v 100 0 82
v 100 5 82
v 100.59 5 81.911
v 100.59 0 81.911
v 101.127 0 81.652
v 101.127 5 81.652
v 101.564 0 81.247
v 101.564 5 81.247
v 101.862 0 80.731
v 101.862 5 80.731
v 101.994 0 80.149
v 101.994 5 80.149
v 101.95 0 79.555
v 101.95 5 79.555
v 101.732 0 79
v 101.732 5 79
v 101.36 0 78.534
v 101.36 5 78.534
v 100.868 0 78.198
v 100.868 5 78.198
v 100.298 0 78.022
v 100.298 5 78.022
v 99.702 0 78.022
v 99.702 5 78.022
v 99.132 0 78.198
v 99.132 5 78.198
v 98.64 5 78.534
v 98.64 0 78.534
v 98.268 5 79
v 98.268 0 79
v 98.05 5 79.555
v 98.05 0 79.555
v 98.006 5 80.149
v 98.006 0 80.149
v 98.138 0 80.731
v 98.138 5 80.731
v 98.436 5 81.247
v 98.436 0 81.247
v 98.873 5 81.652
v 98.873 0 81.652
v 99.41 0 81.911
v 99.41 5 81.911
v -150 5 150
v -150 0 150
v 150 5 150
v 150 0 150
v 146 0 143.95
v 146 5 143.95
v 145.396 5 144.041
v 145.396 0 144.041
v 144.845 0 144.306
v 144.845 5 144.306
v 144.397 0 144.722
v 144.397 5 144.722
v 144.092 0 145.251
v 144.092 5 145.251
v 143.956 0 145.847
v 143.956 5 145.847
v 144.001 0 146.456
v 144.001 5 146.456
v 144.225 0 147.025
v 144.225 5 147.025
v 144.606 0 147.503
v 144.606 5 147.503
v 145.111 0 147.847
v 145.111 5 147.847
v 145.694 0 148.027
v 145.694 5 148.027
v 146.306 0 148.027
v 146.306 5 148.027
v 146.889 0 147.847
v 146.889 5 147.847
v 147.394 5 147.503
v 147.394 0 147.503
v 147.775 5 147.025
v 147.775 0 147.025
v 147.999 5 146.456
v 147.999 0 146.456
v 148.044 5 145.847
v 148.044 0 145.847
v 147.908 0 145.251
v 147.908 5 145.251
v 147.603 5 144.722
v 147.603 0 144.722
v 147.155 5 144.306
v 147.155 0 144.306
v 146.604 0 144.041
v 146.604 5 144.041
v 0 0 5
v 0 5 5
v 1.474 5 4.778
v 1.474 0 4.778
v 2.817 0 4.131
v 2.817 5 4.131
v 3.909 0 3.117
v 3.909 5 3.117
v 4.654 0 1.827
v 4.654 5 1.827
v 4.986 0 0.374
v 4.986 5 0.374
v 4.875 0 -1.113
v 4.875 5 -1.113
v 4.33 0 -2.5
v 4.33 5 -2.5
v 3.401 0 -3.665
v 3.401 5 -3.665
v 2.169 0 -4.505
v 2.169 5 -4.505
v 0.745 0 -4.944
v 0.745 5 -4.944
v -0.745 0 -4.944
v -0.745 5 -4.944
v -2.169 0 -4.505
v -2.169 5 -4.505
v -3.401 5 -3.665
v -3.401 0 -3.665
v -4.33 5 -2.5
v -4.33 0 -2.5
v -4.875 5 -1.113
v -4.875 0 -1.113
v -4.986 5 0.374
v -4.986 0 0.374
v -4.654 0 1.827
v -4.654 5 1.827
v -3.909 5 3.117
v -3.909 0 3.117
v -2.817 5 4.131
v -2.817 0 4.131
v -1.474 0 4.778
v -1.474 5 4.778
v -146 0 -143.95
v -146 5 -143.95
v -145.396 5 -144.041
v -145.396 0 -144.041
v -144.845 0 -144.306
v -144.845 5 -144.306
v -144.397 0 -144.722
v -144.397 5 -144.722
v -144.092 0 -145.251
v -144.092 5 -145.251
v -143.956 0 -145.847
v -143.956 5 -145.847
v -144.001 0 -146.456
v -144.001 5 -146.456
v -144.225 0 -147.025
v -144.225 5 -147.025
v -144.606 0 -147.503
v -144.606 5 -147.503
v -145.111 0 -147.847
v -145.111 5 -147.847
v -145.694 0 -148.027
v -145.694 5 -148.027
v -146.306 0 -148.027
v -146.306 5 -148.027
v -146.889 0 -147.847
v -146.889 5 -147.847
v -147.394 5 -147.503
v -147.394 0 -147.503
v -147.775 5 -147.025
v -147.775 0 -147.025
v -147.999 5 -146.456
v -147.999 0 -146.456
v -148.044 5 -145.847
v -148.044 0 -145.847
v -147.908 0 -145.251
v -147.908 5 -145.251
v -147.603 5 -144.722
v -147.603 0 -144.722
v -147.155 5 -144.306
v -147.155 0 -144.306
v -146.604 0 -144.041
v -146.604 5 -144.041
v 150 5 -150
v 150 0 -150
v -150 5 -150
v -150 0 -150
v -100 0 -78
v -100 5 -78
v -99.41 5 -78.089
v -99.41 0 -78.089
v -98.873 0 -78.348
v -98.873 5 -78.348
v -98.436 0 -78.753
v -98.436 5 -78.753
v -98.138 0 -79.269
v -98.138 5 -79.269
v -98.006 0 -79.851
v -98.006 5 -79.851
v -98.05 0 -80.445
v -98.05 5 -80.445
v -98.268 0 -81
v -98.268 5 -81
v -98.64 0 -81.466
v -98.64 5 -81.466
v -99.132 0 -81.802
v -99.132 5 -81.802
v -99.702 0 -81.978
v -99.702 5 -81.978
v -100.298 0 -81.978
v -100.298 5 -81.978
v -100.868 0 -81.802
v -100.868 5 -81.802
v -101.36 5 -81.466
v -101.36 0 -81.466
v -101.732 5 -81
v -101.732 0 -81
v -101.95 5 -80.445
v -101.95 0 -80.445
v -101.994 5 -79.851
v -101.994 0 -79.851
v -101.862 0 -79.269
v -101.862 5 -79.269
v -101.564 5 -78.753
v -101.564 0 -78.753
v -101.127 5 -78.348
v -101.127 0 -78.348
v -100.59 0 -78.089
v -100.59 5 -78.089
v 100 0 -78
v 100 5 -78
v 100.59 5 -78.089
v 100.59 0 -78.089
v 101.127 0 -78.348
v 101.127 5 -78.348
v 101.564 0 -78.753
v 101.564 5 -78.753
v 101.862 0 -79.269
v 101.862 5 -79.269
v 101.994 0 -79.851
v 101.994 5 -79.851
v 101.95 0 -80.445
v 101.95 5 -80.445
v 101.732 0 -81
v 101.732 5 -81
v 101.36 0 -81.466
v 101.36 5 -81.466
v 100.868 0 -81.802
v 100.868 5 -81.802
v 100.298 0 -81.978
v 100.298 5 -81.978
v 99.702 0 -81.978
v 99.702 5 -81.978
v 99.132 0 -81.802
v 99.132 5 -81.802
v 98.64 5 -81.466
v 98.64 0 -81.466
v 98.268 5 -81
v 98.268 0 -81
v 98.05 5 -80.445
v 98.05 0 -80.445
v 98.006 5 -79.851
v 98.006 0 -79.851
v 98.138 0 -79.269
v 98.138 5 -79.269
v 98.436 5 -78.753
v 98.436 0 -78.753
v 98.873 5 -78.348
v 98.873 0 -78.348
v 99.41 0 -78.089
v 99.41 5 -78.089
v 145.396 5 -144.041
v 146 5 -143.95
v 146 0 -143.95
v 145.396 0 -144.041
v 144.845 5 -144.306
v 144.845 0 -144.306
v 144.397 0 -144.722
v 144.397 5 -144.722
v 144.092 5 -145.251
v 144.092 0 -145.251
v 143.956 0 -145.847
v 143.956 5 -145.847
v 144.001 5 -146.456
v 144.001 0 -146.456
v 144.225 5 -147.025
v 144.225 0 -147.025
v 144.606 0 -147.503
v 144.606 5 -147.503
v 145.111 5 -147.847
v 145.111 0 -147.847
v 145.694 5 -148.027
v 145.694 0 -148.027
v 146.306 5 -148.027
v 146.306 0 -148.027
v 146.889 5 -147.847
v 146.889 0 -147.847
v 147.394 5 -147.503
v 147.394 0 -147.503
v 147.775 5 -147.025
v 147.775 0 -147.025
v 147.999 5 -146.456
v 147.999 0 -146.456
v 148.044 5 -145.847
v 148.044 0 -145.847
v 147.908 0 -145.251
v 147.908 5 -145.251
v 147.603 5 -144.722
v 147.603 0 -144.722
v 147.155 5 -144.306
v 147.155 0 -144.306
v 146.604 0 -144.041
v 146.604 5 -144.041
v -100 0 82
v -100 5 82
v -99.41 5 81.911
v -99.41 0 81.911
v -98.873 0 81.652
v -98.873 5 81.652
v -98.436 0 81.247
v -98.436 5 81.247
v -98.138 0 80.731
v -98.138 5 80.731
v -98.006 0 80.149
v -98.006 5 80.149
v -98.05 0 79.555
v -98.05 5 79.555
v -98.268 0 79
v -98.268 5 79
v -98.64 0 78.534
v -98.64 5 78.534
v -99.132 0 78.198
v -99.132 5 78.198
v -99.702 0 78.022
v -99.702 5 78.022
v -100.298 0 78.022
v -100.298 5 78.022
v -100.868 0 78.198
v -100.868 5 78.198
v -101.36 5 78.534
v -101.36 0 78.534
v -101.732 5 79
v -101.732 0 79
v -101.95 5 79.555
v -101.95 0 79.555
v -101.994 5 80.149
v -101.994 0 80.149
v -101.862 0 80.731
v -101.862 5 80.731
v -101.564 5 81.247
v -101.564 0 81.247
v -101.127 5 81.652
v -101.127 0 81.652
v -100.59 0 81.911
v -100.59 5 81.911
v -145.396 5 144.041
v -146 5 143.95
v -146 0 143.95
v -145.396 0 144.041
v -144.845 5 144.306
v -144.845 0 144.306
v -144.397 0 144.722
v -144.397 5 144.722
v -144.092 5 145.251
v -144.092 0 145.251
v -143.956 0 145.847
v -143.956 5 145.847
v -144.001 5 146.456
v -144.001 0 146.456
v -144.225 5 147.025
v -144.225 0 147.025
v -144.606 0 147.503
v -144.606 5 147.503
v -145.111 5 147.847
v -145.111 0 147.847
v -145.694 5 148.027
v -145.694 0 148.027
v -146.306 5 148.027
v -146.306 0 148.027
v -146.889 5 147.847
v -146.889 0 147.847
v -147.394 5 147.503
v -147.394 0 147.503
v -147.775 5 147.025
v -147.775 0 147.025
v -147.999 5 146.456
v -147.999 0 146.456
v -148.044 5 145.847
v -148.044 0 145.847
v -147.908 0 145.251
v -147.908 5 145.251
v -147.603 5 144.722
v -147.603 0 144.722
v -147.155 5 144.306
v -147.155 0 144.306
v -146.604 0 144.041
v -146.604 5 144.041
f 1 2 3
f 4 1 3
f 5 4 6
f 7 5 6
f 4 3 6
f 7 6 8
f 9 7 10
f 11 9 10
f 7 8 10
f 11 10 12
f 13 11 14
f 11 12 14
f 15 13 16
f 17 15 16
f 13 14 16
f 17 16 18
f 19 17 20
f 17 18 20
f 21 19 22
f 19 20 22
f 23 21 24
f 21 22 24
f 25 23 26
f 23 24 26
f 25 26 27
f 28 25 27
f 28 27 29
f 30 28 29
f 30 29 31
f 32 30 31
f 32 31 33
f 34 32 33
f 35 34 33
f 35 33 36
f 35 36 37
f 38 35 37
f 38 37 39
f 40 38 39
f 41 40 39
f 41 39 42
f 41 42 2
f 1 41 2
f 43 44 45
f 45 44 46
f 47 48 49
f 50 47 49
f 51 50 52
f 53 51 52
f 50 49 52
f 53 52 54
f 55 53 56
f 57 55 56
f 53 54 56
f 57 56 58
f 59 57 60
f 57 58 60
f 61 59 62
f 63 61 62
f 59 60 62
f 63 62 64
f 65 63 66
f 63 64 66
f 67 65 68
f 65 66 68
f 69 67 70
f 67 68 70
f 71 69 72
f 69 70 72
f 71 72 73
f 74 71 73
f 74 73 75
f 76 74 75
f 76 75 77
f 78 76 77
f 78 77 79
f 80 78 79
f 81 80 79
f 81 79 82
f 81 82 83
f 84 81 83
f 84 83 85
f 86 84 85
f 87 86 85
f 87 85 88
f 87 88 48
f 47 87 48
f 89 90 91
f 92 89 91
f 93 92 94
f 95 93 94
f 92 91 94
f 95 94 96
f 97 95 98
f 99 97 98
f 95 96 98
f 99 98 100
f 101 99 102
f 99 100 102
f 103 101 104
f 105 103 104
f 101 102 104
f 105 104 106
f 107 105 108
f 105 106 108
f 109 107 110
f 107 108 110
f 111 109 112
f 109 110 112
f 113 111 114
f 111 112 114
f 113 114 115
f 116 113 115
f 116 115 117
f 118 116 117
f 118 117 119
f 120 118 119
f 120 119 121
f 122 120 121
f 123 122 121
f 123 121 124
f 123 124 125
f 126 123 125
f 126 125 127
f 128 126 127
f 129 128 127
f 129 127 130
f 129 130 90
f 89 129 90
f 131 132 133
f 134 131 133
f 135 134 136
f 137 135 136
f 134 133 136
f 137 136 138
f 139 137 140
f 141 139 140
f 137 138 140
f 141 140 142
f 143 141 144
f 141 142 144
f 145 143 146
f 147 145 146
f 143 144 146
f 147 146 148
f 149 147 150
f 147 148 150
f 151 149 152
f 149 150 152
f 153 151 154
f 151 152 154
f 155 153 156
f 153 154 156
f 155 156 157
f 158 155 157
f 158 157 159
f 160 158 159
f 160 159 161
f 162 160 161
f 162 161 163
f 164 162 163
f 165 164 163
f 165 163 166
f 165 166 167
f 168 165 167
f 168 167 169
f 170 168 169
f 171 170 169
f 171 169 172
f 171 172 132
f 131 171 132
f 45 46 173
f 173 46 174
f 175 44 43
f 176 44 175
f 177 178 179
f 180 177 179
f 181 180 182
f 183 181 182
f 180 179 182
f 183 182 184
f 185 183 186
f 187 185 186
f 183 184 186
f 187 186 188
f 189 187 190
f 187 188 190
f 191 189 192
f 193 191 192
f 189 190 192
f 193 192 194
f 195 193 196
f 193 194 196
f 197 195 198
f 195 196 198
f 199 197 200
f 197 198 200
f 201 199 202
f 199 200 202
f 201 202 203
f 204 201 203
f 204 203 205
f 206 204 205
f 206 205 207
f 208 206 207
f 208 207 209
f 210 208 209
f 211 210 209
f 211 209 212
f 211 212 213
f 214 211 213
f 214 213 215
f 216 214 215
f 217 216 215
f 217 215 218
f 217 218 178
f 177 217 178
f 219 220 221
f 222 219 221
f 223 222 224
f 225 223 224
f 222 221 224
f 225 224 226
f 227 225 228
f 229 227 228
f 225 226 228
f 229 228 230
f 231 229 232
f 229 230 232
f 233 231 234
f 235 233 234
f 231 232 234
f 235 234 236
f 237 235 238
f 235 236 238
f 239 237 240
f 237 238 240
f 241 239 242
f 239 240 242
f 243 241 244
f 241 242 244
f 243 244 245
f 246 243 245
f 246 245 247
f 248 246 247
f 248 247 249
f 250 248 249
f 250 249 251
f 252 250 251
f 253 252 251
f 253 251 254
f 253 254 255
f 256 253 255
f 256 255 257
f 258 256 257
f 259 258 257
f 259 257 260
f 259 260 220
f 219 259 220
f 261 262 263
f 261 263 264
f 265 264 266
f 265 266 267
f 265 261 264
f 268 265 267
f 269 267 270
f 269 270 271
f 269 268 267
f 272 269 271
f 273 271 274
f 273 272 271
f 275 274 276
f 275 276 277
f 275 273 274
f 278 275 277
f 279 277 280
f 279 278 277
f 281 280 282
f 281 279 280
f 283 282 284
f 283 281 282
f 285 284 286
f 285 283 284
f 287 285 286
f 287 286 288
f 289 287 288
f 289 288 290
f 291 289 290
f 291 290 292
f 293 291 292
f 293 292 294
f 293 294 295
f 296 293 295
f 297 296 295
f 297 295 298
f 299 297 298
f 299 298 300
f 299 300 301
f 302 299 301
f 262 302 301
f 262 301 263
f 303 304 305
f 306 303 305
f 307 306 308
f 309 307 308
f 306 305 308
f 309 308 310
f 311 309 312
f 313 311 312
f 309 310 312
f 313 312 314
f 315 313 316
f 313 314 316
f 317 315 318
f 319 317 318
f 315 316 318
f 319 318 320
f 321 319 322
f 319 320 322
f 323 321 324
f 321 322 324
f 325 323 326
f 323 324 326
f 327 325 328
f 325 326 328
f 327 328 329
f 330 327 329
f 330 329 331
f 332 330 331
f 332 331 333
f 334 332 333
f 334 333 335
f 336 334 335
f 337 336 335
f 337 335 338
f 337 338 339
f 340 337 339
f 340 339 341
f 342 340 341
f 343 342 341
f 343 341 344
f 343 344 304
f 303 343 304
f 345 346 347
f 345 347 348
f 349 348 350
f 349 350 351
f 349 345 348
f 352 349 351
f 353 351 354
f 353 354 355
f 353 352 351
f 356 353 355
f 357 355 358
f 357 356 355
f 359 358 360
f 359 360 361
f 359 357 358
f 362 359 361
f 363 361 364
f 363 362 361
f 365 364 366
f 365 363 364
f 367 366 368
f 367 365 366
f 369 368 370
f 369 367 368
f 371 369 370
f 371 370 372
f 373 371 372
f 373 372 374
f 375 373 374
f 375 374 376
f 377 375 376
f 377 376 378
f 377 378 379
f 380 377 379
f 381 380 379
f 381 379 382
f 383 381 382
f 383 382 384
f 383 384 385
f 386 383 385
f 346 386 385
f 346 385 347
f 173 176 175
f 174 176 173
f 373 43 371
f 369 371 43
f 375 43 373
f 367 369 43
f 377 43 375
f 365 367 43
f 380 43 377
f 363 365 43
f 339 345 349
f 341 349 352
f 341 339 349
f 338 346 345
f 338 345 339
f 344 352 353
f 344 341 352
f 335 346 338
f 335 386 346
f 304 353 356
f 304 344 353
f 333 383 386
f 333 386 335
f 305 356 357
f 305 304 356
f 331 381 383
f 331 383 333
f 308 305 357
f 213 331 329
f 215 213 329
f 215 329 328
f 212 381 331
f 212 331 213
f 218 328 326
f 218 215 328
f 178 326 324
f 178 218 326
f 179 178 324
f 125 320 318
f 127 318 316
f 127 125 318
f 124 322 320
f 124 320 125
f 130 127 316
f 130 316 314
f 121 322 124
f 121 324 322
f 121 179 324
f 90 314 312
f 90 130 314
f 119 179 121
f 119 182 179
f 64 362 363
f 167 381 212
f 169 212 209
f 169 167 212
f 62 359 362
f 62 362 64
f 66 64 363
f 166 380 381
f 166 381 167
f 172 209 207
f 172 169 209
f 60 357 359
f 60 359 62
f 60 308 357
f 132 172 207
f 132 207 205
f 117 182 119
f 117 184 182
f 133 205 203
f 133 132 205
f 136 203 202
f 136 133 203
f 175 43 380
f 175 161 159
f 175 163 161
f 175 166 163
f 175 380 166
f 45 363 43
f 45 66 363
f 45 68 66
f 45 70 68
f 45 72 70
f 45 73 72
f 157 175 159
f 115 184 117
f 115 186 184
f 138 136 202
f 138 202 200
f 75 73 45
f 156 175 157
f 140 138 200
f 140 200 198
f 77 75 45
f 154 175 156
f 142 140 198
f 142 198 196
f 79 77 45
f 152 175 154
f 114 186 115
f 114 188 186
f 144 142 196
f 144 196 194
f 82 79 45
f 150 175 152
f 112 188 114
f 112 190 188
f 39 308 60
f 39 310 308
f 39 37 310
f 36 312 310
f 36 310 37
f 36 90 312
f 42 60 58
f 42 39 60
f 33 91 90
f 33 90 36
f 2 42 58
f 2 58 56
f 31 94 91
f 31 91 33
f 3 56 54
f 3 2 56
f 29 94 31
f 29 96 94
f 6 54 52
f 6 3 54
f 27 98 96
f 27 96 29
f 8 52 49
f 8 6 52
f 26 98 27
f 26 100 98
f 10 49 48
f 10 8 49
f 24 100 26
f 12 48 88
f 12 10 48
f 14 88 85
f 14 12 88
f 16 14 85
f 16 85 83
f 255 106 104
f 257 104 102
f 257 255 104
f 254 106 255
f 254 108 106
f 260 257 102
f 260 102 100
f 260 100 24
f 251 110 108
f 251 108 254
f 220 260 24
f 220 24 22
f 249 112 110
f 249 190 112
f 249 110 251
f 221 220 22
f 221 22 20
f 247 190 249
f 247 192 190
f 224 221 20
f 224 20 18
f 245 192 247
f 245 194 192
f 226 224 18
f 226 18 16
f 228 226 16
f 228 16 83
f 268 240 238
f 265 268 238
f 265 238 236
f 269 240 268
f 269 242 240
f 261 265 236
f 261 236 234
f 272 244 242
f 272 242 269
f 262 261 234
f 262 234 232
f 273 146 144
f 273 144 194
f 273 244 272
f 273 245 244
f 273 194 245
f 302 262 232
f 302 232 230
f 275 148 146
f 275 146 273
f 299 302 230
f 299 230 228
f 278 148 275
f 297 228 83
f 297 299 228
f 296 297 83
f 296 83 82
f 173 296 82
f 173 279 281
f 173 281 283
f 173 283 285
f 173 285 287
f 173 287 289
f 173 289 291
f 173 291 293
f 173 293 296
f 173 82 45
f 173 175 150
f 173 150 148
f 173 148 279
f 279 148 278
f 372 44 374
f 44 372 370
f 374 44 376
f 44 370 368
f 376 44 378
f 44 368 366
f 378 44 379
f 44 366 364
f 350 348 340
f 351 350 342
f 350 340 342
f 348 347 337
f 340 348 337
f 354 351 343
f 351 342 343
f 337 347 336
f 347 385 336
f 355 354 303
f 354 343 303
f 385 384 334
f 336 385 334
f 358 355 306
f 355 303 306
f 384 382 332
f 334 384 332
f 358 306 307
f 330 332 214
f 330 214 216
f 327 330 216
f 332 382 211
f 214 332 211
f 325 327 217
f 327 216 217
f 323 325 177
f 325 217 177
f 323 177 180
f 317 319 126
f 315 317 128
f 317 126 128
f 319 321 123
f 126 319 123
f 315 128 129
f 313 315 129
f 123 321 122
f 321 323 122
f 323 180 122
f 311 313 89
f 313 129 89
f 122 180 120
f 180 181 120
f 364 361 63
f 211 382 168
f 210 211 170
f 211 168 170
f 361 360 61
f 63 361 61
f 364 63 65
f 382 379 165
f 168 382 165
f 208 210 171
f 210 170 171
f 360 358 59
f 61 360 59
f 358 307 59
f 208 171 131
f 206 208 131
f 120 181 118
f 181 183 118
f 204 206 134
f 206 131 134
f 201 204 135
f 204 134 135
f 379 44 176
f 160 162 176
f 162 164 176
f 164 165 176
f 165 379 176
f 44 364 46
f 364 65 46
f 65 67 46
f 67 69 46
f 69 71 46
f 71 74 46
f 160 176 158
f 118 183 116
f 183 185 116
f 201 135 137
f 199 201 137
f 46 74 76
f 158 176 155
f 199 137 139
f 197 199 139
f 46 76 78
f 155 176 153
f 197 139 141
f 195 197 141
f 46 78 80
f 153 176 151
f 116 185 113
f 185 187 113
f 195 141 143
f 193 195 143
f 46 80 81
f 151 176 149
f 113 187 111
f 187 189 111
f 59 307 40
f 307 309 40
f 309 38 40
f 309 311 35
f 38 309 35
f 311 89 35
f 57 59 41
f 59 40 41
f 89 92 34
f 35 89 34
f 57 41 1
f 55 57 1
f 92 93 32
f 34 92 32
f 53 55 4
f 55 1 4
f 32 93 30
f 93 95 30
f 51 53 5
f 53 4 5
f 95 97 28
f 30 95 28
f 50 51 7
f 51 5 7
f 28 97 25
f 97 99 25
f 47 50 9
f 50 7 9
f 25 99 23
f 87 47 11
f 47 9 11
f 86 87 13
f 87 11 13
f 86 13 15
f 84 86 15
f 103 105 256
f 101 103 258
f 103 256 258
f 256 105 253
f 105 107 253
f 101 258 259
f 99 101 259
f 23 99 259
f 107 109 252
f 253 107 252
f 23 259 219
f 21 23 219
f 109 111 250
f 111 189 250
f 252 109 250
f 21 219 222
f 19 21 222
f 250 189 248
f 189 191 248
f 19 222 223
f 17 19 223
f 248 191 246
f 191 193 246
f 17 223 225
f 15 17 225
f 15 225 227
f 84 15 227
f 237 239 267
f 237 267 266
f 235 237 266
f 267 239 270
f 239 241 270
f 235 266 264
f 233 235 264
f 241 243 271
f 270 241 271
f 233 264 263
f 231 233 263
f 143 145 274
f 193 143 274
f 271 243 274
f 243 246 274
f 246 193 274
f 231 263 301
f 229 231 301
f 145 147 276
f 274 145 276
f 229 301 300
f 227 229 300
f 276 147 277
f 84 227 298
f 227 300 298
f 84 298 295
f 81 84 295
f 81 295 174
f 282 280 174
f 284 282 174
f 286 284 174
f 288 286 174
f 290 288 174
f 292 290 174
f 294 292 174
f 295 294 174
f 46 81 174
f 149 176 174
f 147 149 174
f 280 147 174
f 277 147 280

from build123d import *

# Parameters (mm, degrees)
SKETCH1_W                                  = 300
SKETCH1_H                                  = 300
BOSS_EXTRUDE1_DEPTH                        = 5
CUT_EXTRUDE1_REACH                         = 214.191
SKETCH2_R                                  = 2.05
MIRROR1_AT_THE_SECOND_PLANE_COPY_1_REACH   = 214.191
MIRROR1_AT_THE_SECOND_PLANE_COPY_1_SKETC_R = 2.05
CUT_EXTRUDE2_REACH                         = 214.191
SKETCH3_R                                  = 2
SKETCH3_R_2                                = 5


with BuildPart() as part:
    # Sketch1 → Boss-Extrude1 (new body)
    with BuildSketch(Plane(origin=(0, 0, 0), x_dir=(1, 0, 0), z_dir=(0, 1, 0))):
        Rectangle(SKETCH1_W, SKETCH1_H)
    extrude(amount=BOSS_EXTRUDE1_DEPTH)

    # Sketch2 → Cut-Extrude1 (cut, up to next)
    with BuildSketch(Plane(origin=(0, 5, 0), x_dir=(1, 0, 0), z_dir=(0, 1, 0)), mode=Mode.PRIVATE) as cut_extrude1_sk1:
        with Locations(Location((-146, 146, 0), (0, 0, 270))):
            Circle(SKETCH2_R)
    cut_extrude1_tool1 = extrude(cut_extrude1_sk1.sketch, amount=-CUT_EXTRUDE1_REACH, mode=Mode.PRIVATE) & part.part
    cut_extrude1 = cut_extrude1_tool1.solids().sort_by_distance((-146, 5, -146))[0]
    add(cut_extrude1, mode=Mode.SUBTRACT)

    # Mirror1: Cut-Extrude1 across plane
    add(cut_extrude1.mirror(Plane(origin=(0, 0, 0), x_dir=(0, 0, 1), z_dir=(1, 0, 0))), mode=Mode.SUBTRACT)

    # Mirror1 at the second plane: Cut-Extrude1 across plane
    add(cut_extrude1.mirror(Plane.XY), mode=Mode.SUBTRACT)

    # Mirror1 at the second plane copy 1 sketc → Mirror1 at the second plane copy 1 (cut, up to next)
    with BuildSketch(Plane(origin=(0, 5, 0), x_dir=(-1, 0, 0), z_dir=(0, 1, 0)), mode=Mode.PRIVATE) as mirror1_at_the_second_plane_copy_1_sk1:
        with Locations(Location((-146, 146, 0), (0, 0, 270))):
            Circle(MIRROR1_AT_THE_SECOND_PLANE_COPY_1_SKETC_R)
    mirror1_at_the_second_plane_copy_1_tool1 = extrude(mirror1_at_the_second_plane_copy_1_sk1.sketch, amount=-MIRROR1_AT_THE_SECOND_PLANE_COPY_1_REACH, mode=Mode.PRIVATE) & part.part
    add(mirror1_at_the_second_plane_copy_1_tool1.solids().sort_by_distance((146, 5, 146))[0], mode=Mode.SUBTRACT)

    # Sketch3 → Cut-Extrude2 (cut, up to next)
    with BuildSketch(Plane(origin=(0, 5, 0), x_dir=(1, 0, 0), z_dir=(0, 1, 0)), mode=Mode.PRIVATE) as cut_extrude2_sk1:
        with Locations(Location((-100, 80, 0), (0, 0, 270))):
            Circle(SKETCH3_R)
    cut_extrude2_tool1 = extrude(cut_extrude2_sk1.sketch, amount=-CUT_EXTRUDE2_REACH, mode=Mode.PRIVATE) & part.part
    # Sketch3 → Cut-Extrude2 (cut, up to next)
    with BuildSketch(Plane(origin=(0, 5, 0), x_dir=(1, 0, 0), z_dir=(0, 1, 0)), mode=Mode.PRIVATE) as cut_extrude2_sk2:
        with Locations(Location((100, 80, 0), (0, 0, 270))):
            Circle(SKETCH3_R)
    cut_extrude2_tool2 = extrude(cut_extrude2_sk2.sketch, amount=-CUT_EXTRUDE2_REACH, mode=Mode.PRIVATE) & part.part
    # Sketch3 → Cut-Extrude2 (cut, up to next)
    with BuildSketch(Plane(origin=(0, 5, 0), x_dir=(1, 0, 0), z_dir=(0, 1, 0)), mode=Mode.PRIVATE) as cut_extrude2_sk3:
        with Locations(Location((100, -80, 0), (0, 0, 270))):
            Circle(SKETCH3_R)
    cut_extrude2_tool3 = extrude(cut_extrude2_sk3.sketch, amount=-CUT_EXTRUDE2_REACH, mode=Mode.PRIVATE) & part.part
    # Sketch3 → Cut-Extrude2 (cut, up to next)
    with BuildSketch(Plane(origin=(0, 5, 0), x_dir=(1, 0, 0), z_dir=(0, 1, 0)), mode=Mode.PRIVATE) as cut_extrude2_sk4:
        with Locations(Location((-100, -80, 0), (0, 0, 270))):
            Circle(SKETCH3_R)
    cut_extrude2_tool4 = extrude(cut_extrude2_sk4.sketch, amount=-CUT_EXTRUDE2_REACH, mode=Mode.PRIVATE) & part.part
    # Sketch3 → Cut-Extrude2 (cut, up to next)
    with BuildSketch(Plane(origin=(0, 5, 0), x_dir=(1, 0, 0), z_dir=(0, 1, 0)), mode=Mode.PRIVATE) as cut_extrude2_sk5:
        with Locations(Location((0, 0, 0), (0, 0, 270))):
            Circle(SKETCH3_R_2)
    cut_extrude2_tool5 = extrude(cut_extrude2_sk5.sketch, amount=-CUT_EXTRUDE2_REACH, mode=Mode.PRIVATE) & part.part
    add(cut_extrude2_tool1.solids().sort_by_distance((-100, 5, -80))[0], mode=Mode.SUBTRACT)
    add(cut_extrude2_tool2.solids().sort_by_distance((100, 5, -80))[0], mode=Mode.SUBTRACT)
    add(cut_extrude2_tool3.solids().sort_by_distance((100, 5, 80))[0], mode=Mode.SUBTRACT)
    add(cut_extrude2_tool4.solids().sort_by_distance((-100, 5, 80))[0], mode=Mode.SUBTRACT)
    add(cut_extrude2_tool5.solids().sort_by_distance((0, 5, 0))[0], mode=Mode.SUBTRACT)


solid = part.part
